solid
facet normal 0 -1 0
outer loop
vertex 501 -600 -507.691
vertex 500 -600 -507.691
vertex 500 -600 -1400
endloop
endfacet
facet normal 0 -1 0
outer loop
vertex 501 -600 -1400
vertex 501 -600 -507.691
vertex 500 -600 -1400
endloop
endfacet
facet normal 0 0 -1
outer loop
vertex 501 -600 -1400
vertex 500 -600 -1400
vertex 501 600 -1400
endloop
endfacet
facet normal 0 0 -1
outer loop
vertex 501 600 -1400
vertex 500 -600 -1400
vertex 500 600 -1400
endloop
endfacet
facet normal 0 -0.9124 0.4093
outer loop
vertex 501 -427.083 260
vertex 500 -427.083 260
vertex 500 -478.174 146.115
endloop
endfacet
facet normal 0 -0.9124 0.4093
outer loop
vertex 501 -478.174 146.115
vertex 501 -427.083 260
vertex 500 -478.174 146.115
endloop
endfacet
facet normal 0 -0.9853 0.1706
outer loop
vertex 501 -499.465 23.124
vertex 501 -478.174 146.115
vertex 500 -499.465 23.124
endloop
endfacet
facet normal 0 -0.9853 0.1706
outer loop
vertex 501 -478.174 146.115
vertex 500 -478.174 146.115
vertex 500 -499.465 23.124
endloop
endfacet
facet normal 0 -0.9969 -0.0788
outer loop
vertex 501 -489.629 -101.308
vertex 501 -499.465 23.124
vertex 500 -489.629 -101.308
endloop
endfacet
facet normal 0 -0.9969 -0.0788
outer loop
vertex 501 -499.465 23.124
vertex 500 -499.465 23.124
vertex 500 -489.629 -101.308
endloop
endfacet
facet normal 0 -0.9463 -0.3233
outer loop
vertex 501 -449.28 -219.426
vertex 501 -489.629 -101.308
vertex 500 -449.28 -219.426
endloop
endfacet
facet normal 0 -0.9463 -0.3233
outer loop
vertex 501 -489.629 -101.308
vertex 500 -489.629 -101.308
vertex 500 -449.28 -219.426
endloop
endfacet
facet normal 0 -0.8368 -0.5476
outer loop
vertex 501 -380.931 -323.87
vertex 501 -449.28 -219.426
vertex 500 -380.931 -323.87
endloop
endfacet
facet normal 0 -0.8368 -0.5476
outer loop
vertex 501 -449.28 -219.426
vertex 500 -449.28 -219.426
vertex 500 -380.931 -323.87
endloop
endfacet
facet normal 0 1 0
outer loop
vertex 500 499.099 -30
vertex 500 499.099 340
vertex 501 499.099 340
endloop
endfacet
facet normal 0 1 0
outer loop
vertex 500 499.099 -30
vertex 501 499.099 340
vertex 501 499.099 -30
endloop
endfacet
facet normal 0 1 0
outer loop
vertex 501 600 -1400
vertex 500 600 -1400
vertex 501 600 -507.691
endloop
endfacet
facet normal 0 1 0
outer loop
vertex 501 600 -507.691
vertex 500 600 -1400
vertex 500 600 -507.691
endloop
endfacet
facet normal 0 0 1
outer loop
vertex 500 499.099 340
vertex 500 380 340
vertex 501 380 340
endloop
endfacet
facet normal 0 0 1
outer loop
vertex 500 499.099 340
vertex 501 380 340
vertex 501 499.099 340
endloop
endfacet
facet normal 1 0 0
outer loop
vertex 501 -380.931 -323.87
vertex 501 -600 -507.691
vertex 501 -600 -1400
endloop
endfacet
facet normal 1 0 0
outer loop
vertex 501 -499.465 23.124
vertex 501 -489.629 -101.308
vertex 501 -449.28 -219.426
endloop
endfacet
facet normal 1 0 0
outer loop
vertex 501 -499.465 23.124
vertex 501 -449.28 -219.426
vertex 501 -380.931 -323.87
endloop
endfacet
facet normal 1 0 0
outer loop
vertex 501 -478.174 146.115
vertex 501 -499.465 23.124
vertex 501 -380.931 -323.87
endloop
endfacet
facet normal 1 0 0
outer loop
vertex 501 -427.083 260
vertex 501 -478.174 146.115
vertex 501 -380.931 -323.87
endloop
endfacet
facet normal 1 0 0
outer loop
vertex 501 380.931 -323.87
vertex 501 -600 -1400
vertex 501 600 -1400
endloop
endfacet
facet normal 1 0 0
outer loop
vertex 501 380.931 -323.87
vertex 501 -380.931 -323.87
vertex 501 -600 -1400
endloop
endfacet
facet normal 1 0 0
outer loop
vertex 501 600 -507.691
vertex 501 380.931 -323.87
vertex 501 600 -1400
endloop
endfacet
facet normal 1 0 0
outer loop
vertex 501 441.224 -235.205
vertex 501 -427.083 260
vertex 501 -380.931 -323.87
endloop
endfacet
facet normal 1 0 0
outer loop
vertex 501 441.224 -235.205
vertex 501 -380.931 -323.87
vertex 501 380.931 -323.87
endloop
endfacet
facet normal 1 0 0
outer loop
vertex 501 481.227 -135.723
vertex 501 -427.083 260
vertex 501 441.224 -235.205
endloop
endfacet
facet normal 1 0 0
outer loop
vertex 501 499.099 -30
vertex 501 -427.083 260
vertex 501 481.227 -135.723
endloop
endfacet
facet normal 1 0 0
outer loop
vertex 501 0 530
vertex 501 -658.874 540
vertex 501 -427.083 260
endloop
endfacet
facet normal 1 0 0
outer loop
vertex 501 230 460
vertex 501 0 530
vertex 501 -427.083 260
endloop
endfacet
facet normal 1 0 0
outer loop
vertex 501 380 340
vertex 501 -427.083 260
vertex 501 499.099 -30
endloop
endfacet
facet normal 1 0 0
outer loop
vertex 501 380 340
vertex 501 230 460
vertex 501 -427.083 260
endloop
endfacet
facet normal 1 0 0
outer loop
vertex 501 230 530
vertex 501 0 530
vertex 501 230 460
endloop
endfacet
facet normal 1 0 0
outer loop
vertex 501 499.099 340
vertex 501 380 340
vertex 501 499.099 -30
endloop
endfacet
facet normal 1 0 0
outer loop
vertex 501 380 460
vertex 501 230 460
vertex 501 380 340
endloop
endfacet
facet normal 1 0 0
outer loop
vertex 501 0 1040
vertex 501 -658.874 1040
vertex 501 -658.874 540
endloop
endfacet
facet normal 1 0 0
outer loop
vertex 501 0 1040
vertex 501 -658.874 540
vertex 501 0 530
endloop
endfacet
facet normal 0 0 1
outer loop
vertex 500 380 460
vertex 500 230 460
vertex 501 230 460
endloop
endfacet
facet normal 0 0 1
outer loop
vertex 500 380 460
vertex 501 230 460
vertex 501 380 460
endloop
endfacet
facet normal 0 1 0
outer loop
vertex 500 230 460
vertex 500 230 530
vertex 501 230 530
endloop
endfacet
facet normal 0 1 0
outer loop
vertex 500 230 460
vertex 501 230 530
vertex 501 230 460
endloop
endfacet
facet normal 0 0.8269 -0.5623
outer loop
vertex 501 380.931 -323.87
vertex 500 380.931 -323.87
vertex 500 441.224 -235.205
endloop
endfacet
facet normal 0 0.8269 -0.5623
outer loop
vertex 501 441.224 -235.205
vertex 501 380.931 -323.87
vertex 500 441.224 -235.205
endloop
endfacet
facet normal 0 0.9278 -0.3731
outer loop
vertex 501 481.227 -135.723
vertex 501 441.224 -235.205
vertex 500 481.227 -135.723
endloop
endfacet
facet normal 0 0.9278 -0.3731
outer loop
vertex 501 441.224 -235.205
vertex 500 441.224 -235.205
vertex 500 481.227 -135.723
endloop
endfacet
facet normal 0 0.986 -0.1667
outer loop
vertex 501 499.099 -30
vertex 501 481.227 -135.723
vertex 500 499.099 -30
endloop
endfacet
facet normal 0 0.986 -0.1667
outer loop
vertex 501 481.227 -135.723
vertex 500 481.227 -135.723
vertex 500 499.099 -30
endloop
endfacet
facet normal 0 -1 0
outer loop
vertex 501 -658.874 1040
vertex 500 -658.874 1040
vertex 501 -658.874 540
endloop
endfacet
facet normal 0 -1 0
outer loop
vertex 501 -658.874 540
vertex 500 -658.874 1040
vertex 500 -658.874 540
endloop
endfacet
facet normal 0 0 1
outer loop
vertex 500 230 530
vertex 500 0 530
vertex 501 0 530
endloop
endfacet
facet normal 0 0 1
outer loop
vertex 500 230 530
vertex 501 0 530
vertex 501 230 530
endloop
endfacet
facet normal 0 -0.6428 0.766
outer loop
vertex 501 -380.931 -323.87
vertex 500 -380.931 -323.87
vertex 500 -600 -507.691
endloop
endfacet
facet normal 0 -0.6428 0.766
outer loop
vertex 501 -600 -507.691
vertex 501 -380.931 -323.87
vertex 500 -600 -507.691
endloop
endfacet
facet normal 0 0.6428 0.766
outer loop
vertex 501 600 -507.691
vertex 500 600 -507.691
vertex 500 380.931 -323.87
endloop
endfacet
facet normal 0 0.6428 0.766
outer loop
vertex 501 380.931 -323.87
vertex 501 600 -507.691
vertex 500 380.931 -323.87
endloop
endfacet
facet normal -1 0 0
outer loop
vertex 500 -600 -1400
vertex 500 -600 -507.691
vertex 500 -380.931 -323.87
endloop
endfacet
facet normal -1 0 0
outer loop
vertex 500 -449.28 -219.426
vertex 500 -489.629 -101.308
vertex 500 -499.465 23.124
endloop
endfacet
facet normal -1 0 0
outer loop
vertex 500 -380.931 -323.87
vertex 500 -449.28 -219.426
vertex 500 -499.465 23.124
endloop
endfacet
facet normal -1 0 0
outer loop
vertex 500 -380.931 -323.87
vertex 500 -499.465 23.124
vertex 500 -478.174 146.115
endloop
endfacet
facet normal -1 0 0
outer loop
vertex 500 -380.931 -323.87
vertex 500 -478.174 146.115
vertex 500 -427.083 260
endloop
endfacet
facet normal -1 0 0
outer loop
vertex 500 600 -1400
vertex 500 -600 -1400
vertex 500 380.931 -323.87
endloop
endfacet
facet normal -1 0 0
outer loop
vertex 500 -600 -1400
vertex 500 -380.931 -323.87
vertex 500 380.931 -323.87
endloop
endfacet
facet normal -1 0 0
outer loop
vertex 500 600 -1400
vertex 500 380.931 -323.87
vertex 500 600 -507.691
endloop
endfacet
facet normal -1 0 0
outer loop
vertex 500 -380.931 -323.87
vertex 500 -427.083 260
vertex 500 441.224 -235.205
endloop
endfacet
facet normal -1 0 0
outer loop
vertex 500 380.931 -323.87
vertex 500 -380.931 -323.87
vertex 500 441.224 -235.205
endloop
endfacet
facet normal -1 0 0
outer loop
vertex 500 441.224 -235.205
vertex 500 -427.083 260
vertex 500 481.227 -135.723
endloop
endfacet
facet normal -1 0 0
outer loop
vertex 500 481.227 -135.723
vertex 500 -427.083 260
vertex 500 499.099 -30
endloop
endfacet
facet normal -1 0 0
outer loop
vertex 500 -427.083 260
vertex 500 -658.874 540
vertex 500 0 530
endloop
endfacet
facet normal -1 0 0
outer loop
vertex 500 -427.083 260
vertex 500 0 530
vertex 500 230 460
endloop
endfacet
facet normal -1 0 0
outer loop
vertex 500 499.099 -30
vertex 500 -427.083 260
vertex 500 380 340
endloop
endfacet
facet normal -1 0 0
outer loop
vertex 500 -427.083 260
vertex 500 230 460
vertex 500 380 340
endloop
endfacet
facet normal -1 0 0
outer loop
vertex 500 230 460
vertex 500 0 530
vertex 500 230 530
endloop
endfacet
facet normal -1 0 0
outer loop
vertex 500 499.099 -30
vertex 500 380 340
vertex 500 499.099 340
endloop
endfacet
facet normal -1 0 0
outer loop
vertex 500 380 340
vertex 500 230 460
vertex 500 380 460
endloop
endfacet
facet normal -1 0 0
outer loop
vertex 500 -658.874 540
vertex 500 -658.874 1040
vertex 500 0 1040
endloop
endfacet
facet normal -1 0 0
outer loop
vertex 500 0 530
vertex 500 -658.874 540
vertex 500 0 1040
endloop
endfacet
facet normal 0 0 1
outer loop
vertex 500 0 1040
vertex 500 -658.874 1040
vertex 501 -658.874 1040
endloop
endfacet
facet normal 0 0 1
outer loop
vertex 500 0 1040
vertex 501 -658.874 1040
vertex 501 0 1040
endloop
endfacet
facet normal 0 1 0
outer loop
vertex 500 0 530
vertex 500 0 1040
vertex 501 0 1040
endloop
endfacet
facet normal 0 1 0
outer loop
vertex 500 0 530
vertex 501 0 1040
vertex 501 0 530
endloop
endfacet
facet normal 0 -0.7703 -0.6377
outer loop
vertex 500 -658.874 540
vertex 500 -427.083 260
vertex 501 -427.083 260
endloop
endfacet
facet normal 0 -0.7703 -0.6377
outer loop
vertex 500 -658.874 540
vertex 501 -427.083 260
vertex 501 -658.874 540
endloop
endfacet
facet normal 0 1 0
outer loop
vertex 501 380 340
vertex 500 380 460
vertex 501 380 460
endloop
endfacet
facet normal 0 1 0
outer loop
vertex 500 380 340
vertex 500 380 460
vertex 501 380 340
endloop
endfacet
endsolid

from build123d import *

# Parameters (mm, degrees)
PAD_DEPTH = 1


with BuildPart() as part:
    # Sketch → Pad (new body)
    with BuildSketch(Plane.YZ.offset(500)):
        with BuildLine():
            ThreePointArc((-427.08313, 260), (-498.445232, -39.399887), (-380.9308, -323.869921))
            Line((-380.9308, -323.869921), (-600, -507.690796))
            Line((-600, -507.690796), (-600, -1400))
            Line((-600, -1400), (600, -1400))
            Line((600, -1400), (600, -507.690796))
            Line((600, -507.690796), (380.9308, -323.869921))
            ThreePointArc((380.9308, -323.869921), (463.899857, -186.539332), (499.099189, -30))
            Line((499.099189, 340), (499.099189, -30))
            Line((380, 340), (499.099189, 340))
            Line((380, 460), (380, 340))
            Line((230, 460), (380, 460))
            Line((230, 530), (230, 460))
            Line((0, 530), (230, 530))
            Line((0, 1040), (0, 530))
            Line((-658.874021, 1040), (0, 1040))
            Line((-658.874021, 1040), (-658.874021, 540))
            Line((-427.08313, 260), (-658.874021, 540))
        make_face()
    extrude(amount=PAD_DEPTH)


solid = part.part
